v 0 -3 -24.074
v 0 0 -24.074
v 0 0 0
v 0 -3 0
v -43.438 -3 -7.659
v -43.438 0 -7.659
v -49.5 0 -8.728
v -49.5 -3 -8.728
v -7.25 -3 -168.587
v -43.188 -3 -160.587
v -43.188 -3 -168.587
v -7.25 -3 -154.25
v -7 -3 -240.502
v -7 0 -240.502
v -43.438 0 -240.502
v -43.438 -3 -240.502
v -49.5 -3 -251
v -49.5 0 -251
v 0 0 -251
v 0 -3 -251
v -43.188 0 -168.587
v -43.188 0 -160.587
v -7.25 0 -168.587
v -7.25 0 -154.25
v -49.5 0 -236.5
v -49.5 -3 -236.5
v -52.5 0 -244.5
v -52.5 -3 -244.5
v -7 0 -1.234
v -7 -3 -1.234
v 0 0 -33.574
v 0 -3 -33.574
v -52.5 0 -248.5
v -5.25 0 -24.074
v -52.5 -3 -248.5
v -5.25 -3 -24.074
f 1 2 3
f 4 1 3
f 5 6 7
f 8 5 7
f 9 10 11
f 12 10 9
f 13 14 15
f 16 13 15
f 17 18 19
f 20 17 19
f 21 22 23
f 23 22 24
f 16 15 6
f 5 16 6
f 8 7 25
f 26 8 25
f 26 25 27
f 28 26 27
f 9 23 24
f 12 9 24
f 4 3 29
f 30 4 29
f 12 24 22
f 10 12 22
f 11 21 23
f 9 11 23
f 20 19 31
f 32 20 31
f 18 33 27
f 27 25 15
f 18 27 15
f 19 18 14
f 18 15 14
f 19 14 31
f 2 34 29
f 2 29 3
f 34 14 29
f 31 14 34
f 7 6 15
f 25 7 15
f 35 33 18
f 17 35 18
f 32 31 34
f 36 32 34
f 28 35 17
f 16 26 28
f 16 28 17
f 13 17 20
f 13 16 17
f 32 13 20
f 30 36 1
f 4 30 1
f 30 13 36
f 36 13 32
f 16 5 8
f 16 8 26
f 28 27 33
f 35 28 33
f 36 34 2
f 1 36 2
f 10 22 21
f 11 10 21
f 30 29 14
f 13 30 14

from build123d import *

# Parameters (mm, degrees)
F1_DEPTH = 3
F2_DEPTH = 3


# Not quite as in the source:
# - a feature names something its author has since deleted; it is built from what else it names


with BuildPart() as f1:
    # F0 (on Front) → F1 (new body)
    with BuildSketch(Plane.XZ):
        Polygon((-43.1878868615, -160.5870006293), (-43.1878868615, -168.5870006293), (-7.25, -168.5870006293), (-7.25, -154.250181546), align=None)
    extrude(amount=F1_DEPTH)


with BuildPart() as f2:
    # F0 (on Front) → F2 (new body)
    with BuildSketch(Plane.XZ):
        Polygon((-49.5, -251), (0, -251), (0, -33.574), (-5.25, -24.074), (0, -24.074), (0, 0), (-7, -1.234288865), (-7, -240.5024516791), (-43.4378868615, -240.5024516791), (-43.4378868615, -7.6592714386), (-49.5, -8.7281855451), (-49.5, -236.5), (-52.5, -244.5), (-52.5, -248.5), align=None)
    extrude(amount=F2_DEPTH)


solid = Compound([f1.part, f2.part])
